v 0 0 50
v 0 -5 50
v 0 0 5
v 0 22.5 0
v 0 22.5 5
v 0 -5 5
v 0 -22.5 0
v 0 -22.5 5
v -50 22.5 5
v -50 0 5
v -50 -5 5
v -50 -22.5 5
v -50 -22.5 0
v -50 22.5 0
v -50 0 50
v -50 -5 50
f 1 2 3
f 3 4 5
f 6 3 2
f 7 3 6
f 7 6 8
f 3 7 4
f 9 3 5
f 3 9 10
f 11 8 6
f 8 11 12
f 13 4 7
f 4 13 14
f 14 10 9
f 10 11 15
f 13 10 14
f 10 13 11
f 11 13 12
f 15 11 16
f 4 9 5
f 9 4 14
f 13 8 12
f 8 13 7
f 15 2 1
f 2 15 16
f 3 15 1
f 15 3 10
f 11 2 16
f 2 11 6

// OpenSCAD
// Built by bench/smallmodels/features/compiler.py from a list of features.
$fn = 64;
difference() {
  union() {
    translate([-25, 0, 0]) translate([-25, -22.5, 0]) cube([50, 45, 5]);
    translate([-25, -2.5, 0]) translate([-25, -2.5, 0]) cube([50, 5, 50]);
  }
  union() {
    translate([-17, 30, 3.75]) rotate([0, 0, 0]) rotate([0, 90, 0]) cylinder(d = 4.5, h = 1200, center = true);
    translate([17, 30, 3.75]) rotate([0, 0, 0]) rotate([0, 90, 0]) cylinder(d = 4.5, h = 1200, center = true);
  }
}
